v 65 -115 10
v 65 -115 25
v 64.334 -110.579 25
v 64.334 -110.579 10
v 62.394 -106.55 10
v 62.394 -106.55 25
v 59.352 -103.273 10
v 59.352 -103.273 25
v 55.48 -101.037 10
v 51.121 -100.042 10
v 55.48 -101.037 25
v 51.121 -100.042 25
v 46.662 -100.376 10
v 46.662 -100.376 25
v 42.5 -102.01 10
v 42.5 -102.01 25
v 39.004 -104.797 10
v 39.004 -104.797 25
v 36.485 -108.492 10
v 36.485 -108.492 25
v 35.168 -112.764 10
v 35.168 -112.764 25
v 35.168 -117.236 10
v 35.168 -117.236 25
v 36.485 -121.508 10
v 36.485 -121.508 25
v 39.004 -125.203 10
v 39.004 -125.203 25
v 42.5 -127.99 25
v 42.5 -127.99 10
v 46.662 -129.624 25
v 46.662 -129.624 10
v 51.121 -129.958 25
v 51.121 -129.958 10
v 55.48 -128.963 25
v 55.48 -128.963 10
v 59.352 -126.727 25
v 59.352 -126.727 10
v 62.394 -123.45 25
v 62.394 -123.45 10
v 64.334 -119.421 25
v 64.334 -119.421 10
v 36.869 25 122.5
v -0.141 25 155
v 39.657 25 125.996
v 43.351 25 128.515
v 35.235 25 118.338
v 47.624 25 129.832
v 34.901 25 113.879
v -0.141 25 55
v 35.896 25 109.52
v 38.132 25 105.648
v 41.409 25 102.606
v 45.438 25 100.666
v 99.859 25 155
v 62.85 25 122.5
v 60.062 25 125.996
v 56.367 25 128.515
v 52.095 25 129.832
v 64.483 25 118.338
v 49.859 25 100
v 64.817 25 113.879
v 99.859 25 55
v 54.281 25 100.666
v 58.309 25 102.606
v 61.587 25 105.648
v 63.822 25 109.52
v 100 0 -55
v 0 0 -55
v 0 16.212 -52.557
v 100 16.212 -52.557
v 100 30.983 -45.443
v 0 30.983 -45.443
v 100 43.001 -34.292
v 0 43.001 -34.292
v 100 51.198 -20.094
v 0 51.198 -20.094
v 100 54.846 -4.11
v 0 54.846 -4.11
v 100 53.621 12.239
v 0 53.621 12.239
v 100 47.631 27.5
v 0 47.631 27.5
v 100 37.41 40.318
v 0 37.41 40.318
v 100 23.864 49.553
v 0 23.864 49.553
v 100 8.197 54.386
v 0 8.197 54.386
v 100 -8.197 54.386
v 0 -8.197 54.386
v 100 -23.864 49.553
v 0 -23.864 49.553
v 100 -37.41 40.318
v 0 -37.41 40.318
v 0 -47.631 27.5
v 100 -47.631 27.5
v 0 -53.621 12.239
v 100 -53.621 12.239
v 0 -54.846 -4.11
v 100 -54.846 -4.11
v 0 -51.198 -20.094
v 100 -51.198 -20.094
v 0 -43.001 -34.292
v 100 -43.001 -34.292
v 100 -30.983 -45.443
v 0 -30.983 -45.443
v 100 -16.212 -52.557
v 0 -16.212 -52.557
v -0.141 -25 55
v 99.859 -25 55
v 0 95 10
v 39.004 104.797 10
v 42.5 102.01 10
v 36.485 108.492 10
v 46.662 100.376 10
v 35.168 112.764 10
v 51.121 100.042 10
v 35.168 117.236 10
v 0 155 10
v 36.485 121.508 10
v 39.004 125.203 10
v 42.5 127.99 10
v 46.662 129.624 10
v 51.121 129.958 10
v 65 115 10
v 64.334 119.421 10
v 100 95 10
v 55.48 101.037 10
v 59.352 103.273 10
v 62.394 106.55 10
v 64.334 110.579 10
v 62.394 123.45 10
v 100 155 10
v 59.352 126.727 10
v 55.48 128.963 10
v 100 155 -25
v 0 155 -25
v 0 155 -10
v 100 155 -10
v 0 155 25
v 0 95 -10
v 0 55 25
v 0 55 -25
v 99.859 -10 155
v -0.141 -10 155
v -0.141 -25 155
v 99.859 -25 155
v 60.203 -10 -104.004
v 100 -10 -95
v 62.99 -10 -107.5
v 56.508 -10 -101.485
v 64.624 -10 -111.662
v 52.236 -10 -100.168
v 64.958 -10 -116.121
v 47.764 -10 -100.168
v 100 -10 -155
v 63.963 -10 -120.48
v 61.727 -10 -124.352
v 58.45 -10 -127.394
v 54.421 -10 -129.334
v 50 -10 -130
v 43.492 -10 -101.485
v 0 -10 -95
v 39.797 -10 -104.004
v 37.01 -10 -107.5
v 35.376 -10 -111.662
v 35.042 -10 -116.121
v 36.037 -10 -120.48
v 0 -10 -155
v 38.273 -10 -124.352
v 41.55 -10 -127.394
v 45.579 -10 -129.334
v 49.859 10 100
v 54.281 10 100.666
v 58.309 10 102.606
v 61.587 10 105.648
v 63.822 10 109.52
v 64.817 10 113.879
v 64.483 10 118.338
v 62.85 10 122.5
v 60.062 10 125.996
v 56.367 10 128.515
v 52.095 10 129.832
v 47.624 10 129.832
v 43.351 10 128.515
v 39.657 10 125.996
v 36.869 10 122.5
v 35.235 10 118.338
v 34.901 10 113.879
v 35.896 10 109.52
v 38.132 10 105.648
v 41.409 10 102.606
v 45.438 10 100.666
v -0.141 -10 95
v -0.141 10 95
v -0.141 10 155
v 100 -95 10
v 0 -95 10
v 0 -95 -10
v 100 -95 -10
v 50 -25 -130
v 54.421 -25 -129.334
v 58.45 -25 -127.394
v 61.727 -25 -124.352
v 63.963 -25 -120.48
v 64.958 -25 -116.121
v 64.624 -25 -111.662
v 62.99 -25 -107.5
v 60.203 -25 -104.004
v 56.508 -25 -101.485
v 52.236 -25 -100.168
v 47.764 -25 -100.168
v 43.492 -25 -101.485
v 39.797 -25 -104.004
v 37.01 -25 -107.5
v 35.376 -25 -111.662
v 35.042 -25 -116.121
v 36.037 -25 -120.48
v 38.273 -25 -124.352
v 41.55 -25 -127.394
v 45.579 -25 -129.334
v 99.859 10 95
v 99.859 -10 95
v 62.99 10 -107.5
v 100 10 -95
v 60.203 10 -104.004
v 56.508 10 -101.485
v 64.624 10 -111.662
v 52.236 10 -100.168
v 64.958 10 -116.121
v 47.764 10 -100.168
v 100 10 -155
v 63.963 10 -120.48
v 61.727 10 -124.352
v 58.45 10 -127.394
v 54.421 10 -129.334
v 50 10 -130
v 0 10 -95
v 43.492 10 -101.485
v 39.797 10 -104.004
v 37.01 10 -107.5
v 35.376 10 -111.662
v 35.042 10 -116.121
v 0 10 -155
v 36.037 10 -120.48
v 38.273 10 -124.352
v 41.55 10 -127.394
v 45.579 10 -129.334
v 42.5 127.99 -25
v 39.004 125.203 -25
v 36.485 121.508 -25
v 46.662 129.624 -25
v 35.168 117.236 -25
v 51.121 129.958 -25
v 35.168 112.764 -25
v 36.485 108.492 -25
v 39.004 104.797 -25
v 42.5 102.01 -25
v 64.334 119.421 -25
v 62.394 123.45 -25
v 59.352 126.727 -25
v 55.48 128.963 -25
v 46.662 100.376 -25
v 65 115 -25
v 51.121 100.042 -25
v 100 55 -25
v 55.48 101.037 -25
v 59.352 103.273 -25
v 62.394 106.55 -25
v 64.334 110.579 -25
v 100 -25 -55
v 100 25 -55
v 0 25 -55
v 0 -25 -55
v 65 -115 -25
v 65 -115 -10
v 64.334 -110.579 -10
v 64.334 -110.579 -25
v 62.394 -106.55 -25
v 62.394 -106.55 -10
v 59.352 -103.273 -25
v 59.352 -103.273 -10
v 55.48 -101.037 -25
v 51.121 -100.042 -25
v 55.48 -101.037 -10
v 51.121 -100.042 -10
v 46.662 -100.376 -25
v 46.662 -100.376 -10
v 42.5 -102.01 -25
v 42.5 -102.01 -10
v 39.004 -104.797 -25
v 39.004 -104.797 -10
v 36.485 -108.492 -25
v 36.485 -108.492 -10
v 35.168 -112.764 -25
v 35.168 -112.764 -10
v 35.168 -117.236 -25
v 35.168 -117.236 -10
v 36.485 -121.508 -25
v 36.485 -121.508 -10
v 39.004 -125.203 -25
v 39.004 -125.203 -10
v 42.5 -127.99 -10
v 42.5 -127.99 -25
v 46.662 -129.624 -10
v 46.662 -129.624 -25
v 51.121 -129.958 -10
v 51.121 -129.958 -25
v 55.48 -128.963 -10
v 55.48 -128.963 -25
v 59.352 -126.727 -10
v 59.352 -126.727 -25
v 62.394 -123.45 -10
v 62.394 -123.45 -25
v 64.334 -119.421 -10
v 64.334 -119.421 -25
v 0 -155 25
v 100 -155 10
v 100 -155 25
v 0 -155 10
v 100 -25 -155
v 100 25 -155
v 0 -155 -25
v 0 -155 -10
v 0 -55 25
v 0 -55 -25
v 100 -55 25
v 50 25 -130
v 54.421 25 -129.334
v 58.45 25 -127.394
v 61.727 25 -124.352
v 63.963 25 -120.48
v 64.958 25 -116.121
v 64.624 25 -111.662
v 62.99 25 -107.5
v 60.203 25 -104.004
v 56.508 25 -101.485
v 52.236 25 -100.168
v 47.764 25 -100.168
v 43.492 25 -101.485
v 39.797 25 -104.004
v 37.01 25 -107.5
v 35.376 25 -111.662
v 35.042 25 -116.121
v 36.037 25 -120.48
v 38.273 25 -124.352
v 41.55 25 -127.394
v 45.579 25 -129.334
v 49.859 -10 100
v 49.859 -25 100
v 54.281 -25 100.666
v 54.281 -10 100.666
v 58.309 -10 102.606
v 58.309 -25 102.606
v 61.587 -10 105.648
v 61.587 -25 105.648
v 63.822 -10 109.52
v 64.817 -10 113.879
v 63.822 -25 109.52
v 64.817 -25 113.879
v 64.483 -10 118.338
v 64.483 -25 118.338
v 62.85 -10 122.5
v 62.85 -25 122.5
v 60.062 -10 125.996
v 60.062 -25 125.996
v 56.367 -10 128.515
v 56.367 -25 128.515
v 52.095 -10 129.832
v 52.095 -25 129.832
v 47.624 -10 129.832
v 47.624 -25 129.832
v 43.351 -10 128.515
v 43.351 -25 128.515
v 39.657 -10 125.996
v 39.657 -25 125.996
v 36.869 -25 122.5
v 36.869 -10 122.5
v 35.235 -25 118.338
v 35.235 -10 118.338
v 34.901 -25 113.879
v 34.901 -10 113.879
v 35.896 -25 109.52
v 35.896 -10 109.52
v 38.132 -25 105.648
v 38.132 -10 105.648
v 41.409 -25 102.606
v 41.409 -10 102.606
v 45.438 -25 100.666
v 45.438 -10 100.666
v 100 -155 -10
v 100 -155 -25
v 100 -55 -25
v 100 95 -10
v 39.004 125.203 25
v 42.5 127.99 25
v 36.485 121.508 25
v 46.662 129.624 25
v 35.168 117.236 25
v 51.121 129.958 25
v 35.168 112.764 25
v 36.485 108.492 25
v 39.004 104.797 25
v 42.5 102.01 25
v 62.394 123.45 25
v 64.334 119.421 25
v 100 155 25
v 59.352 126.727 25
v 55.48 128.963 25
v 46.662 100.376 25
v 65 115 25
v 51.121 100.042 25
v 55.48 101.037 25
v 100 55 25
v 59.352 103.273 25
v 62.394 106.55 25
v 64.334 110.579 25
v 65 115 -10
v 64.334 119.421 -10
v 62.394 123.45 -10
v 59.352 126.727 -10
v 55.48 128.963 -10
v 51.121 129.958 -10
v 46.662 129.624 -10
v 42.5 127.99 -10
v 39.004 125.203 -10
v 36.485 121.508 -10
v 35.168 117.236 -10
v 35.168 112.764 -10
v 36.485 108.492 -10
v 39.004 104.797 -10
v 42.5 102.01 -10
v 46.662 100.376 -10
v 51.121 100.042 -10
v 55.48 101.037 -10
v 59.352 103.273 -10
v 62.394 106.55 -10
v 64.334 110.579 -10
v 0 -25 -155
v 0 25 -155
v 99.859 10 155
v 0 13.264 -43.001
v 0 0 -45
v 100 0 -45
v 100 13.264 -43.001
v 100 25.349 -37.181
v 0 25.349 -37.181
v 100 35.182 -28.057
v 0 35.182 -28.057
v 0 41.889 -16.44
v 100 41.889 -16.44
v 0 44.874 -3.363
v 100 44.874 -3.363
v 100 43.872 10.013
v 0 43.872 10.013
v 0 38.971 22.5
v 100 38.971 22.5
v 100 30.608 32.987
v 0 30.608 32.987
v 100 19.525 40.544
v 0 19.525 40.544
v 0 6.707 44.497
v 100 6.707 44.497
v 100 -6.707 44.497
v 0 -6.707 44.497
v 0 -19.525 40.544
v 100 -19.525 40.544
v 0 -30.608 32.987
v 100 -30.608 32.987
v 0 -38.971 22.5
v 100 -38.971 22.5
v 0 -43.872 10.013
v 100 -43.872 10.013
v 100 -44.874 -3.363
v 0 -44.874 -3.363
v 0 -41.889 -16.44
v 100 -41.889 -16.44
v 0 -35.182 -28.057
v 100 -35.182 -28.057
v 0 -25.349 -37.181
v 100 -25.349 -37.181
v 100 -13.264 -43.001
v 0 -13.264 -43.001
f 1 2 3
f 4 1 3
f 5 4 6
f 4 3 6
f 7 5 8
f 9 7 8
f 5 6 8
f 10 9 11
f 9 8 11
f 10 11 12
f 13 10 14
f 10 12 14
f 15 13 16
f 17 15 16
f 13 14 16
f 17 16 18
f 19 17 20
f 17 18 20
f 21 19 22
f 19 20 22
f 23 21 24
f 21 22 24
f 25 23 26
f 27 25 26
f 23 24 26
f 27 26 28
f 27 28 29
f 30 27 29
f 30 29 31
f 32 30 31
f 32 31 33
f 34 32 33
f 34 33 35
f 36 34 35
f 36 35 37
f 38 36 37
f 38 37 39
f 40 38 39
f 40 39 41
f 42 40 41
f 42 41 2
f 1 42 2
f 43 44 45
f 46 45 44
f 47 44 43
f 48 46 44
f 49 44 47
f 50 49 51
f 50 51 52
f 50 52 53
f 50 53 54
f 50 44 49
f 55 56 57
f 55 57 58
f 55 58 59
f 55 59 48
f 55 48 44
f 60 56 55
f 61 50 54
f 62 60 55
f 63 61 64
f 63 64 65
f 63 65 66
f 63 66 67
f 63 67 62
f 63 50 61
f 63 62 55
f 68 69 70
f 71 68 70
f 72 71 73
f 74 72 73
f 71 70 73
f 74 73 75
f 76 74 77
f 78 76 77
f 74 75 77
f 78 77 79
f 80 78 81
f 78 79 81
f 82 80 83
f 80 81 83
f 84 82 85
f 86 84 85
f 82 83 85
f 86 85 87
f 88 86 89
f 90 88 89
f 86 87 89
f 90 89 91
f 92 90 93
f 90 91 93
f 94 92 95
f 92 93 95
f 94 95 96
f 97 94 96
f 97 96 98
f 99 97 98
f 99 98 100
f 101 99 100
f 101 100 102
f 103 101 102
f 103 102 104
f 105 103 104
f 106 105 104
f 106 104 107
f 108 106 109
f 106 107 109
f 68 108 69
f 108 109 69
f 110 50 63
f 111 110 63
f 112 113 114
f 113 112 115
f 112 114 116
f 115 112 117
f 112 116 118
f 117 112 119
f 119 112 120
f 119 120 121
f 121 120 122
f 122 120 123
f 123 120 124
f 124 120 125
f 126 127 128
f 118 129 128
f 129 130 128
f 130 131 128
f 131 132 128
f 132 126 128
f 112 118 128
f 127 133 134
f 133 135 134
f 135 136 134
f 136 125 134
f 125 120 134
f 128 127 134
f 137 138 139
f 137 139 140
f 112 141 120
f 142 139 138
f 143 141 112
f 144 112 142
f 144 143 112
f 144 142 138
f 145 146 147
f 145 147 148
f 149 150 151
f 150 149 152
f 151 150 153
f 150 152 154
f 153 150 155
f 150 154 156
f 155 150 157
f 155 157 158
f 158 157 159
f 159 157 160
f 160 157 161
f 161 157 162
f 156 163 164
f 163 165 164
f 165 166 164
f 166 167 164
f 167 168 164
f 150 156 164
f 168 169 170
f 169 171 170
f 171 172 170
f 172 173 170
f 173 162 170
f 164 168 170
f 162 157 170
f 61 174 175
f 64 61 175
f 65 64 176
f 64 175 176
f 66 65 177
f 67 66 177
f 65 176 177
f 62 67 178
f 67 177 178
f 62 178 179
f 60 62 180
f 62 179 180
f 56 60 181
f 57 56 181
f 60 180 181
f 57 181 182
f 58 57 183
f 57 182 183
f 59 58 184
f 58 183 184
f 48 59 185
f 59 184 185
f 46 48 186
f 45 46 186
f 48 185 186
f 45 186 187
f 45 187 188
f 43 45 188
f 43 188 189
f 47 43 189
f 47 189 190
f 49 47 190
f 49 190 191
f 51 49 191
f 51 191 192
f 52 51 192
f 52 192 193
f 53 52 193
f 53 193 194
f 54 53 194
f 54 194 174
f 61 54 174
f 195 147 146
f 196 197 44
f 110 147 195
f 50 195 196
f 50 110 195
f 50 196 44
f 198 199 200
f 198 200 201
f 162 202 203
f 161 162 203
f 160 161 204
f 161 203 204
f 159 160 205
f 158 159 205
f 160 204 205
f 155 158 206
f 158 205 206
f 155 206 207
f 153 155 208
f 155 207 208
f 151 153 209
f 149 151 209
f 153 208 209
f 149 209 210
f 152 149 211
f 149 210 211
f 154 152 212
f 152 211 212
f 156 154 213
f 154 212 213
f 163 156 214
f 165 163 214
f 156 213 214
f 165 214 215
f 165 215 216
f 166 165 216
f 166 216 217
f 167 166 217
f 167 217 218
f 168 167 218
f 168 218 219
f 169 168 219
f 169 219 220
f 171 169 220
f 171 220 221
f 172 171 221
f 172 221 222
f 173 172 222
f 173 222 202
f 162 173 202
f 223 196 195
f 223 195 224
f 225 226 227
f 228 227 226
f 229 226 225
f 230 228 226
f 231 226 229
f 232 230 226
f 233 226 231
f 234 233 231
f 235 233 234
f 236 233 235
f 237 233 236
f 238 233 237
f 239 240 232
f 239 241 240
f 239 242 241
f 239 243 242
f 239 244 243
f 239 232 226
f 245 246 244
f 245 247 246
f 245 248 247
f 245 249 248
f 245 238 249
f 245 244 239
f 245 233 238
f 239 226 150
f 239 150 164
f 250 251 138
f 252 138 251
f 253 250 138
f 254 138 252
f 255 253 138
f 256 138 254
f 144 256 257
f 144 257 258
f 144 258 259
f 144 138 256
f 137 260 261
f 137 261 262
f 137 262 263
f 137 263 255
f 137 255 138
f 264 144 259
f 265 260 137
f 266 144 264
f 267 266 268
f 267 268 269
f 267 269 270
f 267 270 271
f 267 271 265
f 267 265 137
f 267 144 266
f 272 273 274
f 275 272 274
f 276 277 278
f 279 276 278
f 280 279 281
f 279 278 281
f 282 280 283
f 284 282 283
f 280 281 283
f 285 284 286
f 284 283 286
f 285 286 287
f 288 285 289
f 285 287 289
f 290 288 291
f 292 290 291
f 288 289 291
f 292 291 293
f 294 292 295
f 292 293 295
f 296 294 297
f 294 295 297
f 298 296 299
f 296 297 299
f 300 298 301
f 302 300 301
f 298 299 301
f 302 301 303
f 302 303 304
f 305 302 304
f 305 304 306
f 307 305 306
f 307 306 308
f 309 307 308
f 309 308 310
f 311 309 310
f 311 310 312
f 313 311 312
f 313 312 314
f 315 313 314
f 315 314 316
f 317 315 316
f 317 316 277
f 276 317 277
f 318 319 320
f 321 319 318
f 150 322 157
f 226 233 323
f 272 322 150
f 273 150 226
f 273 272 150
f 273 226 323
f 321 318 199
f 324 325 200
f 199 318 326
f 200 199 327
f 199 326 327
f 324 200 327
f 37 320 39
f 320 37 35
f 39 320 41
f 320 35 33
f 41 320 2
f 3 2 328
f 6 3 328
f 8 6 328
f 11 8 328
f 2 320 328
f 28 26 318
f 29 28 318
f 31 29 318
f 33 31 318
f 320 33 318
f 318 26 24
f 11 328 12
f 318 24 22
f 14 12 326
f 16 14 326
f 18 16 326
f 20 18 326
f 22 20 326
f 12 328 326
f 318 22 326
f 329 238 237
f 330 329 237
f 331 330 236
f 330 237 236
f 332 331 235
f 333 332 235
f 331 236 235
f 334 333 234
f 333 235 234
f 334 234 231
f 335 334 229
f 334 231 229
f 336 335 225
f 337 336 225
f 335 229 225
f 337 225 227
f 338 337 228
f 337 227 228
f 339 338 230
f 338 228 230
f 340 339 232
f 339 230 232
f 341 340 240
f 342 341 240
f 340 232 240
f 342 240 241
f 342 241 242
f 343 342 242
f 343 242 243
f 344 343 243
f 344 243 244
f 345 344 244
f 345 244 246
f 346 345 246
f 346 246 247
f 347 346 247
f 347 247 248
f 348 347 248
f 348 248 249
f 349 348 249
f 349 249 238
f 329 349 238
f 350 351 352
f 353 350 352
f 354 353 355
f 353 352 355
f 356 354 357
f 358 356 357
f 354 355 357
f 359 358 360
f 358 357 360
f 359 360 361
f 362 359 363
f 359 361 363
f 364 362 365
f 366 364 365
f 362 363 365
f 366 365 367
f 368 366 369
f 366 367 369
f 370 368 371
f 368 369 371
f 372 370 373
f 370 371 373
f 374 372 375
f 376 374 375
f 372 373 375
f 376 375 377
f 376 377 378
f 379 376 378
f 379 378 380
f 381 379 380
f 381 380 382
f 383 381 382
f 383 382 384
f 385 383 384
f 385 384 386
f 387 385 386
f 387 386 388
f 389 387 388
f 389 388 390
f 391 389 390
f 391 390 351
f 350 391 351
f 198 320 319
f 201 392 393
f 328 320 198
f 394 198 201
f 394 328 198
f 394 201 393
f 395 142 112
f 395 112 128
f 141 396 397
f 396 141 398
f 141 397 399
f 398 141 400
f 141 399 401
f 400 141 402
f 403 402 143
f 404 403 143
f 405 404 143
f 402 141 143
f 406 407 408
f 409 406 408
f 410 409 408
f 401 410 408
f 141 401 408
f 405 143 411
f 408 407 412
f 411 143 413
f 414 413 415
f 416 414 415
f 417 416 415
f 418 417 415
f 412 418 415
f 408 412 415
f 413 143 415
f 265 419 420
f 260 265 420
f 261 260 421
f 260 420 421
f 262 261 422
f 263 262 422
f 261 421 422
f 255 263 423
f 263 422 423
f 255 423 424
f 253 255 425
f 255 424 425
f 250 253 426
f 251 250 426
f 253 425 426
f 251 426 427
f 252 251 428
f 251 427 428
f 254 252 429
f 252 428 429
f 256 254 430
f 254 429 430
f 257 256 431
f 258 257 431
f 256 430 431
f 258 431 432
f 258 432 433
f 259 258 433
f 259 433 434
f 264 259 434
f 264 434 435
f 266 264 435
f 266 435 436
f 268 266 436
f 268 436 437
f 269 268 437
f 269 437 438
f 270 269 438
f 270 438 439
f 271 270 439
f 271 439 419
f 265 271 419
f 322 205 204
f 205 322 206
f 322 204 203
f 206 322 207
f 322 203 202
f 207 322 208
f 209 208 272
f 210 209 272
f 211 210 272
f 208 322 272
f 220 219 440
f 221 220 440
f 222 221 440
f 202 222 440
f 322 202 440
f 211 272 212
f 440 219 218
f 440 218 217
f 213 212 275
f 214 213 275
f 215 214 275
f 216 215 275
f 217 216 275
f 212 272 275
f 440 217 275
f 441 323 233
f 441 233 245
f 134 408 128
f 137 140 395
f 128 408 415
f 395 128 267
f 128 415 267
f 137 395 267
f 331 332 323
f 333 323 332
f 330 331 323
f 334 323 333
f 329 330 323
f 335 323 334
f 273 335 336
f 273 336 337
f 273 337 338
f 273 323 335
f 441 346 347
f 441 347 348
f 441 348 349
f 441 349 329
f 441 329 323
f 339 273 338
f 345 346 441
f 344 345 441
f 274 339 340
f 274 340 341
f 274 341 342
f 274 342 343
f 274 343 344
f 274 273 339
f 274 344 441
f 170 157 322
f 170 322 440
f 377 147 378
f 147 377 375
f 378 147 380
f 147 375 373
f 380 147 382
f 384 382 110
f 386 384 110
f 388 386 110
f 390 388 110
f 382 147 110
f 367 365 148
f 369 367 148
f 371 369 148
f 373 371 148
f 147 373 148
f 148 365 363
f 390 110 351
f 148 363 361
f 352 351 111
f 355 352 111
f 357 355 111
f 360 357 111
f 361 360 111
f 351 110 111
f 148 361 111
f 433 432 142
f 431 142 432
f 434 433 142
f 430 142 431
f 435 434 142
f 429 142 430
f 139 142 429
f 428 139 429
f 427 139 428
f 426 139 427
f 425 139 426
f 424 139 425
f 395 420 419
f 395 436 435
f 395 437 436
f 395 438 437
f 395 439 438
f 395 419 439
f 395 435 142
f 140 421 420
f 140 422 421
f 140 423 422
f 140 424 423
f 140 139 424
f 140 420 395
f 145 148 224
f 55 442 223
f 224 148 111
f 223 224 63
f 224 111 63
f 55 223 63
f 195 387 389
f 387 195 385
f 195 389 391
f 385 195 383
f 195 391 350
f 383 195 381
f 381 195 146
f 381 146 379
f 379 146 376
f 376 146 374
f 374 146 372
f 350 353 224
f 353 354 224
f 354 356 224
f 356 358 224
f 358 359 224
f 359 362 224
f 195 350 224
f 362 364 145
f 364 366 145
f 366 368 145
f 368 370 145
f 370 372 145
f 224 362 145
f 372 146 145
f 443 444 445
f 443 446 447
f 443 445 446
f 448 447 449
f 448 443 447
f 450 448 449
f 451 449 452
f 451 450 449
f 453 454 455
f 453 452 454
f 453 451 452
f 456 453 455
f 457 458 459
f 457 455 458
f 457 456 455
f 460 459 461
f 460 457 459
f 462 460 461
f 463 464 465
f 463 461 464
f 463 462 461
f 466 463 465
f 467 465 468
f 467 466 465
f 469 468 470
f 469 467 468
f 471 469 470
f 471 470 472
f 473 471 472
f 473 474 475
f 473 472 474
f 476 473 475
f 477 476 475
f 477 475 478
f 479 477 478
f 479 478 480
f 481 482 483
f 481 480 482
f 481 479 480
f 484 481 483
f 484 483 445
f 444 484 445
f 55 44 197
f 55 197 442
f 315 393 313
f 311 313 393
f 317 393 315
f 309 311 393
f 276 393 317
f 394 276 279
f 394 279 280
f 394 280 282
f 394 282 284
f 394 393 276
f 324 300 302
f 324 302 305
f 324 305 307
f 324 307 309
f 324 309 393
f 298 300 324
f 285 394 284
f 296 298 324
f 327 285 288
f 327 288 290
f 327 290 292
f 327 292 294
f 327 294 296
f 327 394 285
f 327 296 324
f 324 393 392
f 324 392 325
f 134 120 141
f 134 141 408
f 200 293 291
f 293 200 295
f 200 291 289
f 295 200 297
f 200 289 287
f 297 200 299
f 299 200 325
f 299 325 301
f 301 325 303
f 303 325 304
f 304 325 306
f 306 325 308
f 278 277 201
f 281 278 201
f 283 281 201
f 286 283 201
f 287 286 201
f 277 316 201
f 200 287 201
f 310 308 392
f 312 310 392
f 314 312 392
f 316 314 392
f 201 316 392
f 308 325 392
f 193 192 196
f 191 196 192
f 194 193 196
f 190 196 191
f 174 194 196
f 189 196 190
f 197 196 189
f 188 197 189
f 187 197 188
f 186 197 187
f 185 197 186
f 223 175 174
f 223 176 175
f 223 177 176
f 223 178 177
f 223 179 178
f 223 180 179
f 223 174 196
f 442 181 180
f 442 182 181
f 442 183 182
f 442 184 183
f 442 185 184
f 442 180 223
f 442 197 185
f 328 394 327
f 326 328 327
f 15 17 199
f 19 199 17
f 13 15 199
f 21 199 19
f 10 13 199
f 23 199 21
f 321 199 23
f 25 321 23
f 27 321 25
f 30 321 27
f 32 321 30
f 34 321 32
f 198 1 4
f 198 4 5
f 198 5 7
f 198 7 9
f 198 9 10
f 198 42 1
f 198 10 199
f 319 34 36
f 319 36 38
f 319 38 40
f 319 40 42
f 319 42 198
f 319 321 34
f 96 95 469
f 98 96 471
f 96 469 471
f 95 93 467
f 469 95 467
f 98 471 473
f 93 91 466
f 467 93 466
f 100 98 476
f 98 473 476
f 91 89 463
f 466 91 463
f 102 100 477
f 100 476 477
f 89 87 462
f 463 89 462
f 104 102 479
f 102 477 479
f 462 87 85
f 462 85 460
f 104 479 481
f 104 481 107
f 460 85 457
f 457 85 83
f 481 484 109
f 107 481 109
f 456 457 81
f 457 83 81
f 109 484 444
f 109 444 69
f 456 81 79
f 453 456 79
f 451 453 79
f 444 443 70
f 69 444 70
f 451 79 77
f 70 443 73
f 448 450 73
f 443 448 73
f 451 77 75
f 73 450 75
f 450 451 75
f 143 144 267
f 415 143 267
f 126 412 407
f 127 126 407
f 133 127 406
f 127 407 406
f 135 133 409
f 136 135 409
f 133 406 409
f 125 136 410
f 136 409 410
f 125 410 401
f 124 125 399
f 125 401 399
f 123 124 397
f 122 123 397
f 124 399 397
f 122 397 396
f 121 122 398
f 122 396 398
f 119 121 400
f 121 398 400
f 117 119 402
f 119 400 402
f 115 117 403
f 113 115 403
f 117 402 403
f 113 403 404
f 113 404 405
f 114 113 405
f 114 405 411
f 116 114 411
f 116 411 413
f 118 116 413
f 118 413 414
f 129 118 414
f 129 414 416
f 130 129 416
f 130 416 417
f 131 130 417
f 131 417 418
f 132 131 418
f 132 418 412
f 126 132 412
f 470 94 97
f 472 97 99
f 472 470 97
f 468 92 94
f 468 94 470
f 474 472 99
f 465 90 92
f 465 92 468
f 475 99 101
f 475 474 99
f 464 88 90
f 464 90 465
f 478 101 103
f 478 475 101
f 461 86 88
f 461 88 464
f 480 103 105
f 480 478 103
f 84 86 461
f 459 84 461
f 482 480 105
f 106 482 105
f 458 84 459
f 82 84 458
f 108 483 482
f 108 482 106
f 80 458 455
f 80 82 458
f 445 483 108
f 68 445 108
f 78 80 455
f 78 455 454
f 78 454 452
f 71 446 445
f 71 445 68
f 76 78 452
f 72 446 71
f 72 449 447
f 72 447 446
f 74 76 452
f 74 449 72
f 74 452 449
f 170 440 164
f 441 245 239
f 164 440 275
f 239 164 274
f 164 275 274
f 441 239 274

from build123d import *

# Parameters (mm, degrees)
SKETCH_1_R           = 55
EXTRUDE_1_DEPTH      = 100
SHELL_1_T            = -10
SKETCH_2_W           = 100
SKETCH_2_H           = 50
EXTRUDE_2_DEPTH      = 100
SKETCH_3_W           = 110
SKETCH_3_H           = 20
CUT_EXTRUDE_5_DEPTH  = 60
SKETCH_4_R           = 15
CUT_EXTRUDE_6_DEPTH  = 60
SKETCH_6_W           = 100
SKETCH_6_H           = 50
EXTRUDE_4_DEPTH      = 100
SKETCH_7_W           = 110
SKETCH_7_H           = 20
CUT_EXTRUDE_8_DEPTH  = 60
SKETCH_8_R           = 15
CUT_EXTRUDE_9_DEPTH  = 60
SKETCH_9_W           = 100
SKETCH_9_H           = 50
EXTRUDE_5_DEPTH      = 100
SKETCH_10_W          = 104.303969261
SKETCH_10_H          = 20
CUT_EXTRUDE_11_DEPTH = 60
SKETCH_11_R          = 15
CUT_EXTRUDE_12_DEPTH = 60
SKETCH_12_W          = 100
SKETCH_12_H          = 50
EXTRUDE_6_DEPTH      = 100
SKETCH_13_W          = 142.106913732
SKETCH_13_H          = 20
CUT_EXTRUDE_13_DEPTH = 60
SKETCH_14_R          = 15
CUT_EXTRUDE_14_DEPTH = 60


with BuildPart() as part:
    # 草图1 → 凸台-拉伸1 (new body)
    with BuildSketch(Plane(origin=(0, 0, 0), x_dir=(0, 0, -1), z_dir=(1, 0, 0))):
        Circle(SKETCH_1_R)
    extrude(amount=EXTRUDE_1_DEPTH)

    # 抽壳1
    shell_1_openings = [part.faces().sort_by_distance(p)[0] for p in [
        (100, 0, 0),
        (0, 0, 0),
    ]]
    offset(amount=SHELL_1_T, openings=shell_1_openings, kind=Kind.INTERSECTION)


with BuildPart() as body_2:
    # 草图2 → 凸台-拉伸2 (new body)
    with BuildSketch(Plane(origin=(0, 0, -55), x_dir=(-1, 0, 0), z_dir=(0, 0, -1))):
        with Locations((-50, 0)):
            Rectangle(SKETCH_2_W, SKETCH_2_H)
    extrude(amount=EXTRUDE_2_DEPTH)

    # 草图3 → 切除-拉伸5 (cut)
    with BuildSketch(Plane(origin=(0, 0, -155), x_dir=(-1, 0, 0), z_dir=(0, 0, -1))):
        with Locations((-50.103871793, 0)):
            Rectangle(SKETCH_3_W, SKETCH_3_H)
    extrude(amount=-CUT_EXTRUDE_5_DEPTH, mode=Mode.SUBTRACT)

    # 草图4 → 切除-拉伸6 (cut)
    with BuildSketch(Plane.XZ.offset(25)):
        with Locations(Location((50, -115, 0), (0, 0, 270))):
            Circle(SKETCH_4_R)
    extrude(amount=-CUT_EXTRUDE_6_DEPTH, mode=Mode.SUBTRACT)


with BuildPart() as body_3:
    # 草图6 → 凸台-拉伸4 (new body)
    with BuildSketch(Plane.XY.offset(55)):
        with Locations((49.859213062, 0)):
            Rectangle(SKETCH_6_W, SKETCH_6_H)
    extrude(amount=EXTRUDE_4_DEPTH)

    # 草图7 → 切除-拉伸8 (cut)
    with BuildSketch(Plane.XY.offset(155)):
        with Locations((45, 0)):
            Rectangle(SKETCH_7_W, SKETCH_7_H)
    extrude(amount=-CUT_EXTRUDE_8_DEPTH, mode=Mode.SUBTRACT)

    # 草图8 → 切除-拉伸9 (cut)
    with BuildSketch(Plane.XZ.offset(25)):
        with Locations(Location((49.859213062, 115, 0), (0, 0, 270))):
            Circle(SKETCH_8_R)
    extrude(amount=-CUT_EXTRUDE_9_DEPTH, mode=Mode.SUBTRACT)


with BuildPart() as body_4:
    # 草图9 → 凸台-拉伸5 (new body)
    with BuildSketch(Plane(origin=(0, -55, 0), x_dir=(-1, 0, 0), z_dir=(0, -1, 0))):
        with Locations((-50, 0)):
            Rectangle(SKETCH_9_W, SKETCH_9_H)
    extrude(amount=EXTRUDE_5_DEPTH)

    # 草图10 → 切除-拉伸11 (cut)
    with BuildSketch(Plane.XZ.offset(155)):
        with Locations((47.848015369, 0)):
            Rectangle(SKETCH_10_W, SKETCH_10_H)
    extrude(amount=-CUT_EXTRUDE_11_DEPTH, mode=Mode.SUBTRACT)

    # 草图11 → 切除-拉伸12 (cut)
    with BuildSketch(Plane.XY.offset(25)):
        with Locations((50, -115)):
            Circle(SKETCH_11_R)
    extrude(amount=-CUT_EXTRUDE_12_DEPTH, mode=Mode.SUBTRACT)


with BuildPart() as body_5:
    # 草图12 → 凸台-拉伸6 (new body)
    with BuildSketch(Plane(origin=(0, 55, 0), x_dir=(1, 0, 0), z_dir=(0, 1, 0))):
        with Locations((50, 0)):
            Rectangle(SKETCH_12_W, SKETCH_12_H)
    extrude(amount=EXTRUDE_6_DEPTH)

    # 草图13 → 切除-拉伸13 (cut)
    with BuildSketch(Plane(origin=(0, 155, 0), x_dir=(1, 0, 0), z_dir=(0, 1, 0))):
        with Locations((52.372018241, 0)):
            Rectangle(SKETCH_13_W, SKETCH_13_H)
    extrude(amount=-CUT_EXTRUDE_13_DEPTH, mode=Mode.SUBTRACT)

    # 草图14 → 切除-拉伸14 (cut)
    with BuildSketch(Plane.XY.offset(25)):
        with Locations((50, 115)):
            Circle(SKETCH_14_R)
    extrude(amount=-CUT_EXTRUDE_14_DEPTH, mode=Mode.SUBTRACT)


solid = Compound([part.part, body_2.part, body_3.part, body_4.part, body_5.part])
